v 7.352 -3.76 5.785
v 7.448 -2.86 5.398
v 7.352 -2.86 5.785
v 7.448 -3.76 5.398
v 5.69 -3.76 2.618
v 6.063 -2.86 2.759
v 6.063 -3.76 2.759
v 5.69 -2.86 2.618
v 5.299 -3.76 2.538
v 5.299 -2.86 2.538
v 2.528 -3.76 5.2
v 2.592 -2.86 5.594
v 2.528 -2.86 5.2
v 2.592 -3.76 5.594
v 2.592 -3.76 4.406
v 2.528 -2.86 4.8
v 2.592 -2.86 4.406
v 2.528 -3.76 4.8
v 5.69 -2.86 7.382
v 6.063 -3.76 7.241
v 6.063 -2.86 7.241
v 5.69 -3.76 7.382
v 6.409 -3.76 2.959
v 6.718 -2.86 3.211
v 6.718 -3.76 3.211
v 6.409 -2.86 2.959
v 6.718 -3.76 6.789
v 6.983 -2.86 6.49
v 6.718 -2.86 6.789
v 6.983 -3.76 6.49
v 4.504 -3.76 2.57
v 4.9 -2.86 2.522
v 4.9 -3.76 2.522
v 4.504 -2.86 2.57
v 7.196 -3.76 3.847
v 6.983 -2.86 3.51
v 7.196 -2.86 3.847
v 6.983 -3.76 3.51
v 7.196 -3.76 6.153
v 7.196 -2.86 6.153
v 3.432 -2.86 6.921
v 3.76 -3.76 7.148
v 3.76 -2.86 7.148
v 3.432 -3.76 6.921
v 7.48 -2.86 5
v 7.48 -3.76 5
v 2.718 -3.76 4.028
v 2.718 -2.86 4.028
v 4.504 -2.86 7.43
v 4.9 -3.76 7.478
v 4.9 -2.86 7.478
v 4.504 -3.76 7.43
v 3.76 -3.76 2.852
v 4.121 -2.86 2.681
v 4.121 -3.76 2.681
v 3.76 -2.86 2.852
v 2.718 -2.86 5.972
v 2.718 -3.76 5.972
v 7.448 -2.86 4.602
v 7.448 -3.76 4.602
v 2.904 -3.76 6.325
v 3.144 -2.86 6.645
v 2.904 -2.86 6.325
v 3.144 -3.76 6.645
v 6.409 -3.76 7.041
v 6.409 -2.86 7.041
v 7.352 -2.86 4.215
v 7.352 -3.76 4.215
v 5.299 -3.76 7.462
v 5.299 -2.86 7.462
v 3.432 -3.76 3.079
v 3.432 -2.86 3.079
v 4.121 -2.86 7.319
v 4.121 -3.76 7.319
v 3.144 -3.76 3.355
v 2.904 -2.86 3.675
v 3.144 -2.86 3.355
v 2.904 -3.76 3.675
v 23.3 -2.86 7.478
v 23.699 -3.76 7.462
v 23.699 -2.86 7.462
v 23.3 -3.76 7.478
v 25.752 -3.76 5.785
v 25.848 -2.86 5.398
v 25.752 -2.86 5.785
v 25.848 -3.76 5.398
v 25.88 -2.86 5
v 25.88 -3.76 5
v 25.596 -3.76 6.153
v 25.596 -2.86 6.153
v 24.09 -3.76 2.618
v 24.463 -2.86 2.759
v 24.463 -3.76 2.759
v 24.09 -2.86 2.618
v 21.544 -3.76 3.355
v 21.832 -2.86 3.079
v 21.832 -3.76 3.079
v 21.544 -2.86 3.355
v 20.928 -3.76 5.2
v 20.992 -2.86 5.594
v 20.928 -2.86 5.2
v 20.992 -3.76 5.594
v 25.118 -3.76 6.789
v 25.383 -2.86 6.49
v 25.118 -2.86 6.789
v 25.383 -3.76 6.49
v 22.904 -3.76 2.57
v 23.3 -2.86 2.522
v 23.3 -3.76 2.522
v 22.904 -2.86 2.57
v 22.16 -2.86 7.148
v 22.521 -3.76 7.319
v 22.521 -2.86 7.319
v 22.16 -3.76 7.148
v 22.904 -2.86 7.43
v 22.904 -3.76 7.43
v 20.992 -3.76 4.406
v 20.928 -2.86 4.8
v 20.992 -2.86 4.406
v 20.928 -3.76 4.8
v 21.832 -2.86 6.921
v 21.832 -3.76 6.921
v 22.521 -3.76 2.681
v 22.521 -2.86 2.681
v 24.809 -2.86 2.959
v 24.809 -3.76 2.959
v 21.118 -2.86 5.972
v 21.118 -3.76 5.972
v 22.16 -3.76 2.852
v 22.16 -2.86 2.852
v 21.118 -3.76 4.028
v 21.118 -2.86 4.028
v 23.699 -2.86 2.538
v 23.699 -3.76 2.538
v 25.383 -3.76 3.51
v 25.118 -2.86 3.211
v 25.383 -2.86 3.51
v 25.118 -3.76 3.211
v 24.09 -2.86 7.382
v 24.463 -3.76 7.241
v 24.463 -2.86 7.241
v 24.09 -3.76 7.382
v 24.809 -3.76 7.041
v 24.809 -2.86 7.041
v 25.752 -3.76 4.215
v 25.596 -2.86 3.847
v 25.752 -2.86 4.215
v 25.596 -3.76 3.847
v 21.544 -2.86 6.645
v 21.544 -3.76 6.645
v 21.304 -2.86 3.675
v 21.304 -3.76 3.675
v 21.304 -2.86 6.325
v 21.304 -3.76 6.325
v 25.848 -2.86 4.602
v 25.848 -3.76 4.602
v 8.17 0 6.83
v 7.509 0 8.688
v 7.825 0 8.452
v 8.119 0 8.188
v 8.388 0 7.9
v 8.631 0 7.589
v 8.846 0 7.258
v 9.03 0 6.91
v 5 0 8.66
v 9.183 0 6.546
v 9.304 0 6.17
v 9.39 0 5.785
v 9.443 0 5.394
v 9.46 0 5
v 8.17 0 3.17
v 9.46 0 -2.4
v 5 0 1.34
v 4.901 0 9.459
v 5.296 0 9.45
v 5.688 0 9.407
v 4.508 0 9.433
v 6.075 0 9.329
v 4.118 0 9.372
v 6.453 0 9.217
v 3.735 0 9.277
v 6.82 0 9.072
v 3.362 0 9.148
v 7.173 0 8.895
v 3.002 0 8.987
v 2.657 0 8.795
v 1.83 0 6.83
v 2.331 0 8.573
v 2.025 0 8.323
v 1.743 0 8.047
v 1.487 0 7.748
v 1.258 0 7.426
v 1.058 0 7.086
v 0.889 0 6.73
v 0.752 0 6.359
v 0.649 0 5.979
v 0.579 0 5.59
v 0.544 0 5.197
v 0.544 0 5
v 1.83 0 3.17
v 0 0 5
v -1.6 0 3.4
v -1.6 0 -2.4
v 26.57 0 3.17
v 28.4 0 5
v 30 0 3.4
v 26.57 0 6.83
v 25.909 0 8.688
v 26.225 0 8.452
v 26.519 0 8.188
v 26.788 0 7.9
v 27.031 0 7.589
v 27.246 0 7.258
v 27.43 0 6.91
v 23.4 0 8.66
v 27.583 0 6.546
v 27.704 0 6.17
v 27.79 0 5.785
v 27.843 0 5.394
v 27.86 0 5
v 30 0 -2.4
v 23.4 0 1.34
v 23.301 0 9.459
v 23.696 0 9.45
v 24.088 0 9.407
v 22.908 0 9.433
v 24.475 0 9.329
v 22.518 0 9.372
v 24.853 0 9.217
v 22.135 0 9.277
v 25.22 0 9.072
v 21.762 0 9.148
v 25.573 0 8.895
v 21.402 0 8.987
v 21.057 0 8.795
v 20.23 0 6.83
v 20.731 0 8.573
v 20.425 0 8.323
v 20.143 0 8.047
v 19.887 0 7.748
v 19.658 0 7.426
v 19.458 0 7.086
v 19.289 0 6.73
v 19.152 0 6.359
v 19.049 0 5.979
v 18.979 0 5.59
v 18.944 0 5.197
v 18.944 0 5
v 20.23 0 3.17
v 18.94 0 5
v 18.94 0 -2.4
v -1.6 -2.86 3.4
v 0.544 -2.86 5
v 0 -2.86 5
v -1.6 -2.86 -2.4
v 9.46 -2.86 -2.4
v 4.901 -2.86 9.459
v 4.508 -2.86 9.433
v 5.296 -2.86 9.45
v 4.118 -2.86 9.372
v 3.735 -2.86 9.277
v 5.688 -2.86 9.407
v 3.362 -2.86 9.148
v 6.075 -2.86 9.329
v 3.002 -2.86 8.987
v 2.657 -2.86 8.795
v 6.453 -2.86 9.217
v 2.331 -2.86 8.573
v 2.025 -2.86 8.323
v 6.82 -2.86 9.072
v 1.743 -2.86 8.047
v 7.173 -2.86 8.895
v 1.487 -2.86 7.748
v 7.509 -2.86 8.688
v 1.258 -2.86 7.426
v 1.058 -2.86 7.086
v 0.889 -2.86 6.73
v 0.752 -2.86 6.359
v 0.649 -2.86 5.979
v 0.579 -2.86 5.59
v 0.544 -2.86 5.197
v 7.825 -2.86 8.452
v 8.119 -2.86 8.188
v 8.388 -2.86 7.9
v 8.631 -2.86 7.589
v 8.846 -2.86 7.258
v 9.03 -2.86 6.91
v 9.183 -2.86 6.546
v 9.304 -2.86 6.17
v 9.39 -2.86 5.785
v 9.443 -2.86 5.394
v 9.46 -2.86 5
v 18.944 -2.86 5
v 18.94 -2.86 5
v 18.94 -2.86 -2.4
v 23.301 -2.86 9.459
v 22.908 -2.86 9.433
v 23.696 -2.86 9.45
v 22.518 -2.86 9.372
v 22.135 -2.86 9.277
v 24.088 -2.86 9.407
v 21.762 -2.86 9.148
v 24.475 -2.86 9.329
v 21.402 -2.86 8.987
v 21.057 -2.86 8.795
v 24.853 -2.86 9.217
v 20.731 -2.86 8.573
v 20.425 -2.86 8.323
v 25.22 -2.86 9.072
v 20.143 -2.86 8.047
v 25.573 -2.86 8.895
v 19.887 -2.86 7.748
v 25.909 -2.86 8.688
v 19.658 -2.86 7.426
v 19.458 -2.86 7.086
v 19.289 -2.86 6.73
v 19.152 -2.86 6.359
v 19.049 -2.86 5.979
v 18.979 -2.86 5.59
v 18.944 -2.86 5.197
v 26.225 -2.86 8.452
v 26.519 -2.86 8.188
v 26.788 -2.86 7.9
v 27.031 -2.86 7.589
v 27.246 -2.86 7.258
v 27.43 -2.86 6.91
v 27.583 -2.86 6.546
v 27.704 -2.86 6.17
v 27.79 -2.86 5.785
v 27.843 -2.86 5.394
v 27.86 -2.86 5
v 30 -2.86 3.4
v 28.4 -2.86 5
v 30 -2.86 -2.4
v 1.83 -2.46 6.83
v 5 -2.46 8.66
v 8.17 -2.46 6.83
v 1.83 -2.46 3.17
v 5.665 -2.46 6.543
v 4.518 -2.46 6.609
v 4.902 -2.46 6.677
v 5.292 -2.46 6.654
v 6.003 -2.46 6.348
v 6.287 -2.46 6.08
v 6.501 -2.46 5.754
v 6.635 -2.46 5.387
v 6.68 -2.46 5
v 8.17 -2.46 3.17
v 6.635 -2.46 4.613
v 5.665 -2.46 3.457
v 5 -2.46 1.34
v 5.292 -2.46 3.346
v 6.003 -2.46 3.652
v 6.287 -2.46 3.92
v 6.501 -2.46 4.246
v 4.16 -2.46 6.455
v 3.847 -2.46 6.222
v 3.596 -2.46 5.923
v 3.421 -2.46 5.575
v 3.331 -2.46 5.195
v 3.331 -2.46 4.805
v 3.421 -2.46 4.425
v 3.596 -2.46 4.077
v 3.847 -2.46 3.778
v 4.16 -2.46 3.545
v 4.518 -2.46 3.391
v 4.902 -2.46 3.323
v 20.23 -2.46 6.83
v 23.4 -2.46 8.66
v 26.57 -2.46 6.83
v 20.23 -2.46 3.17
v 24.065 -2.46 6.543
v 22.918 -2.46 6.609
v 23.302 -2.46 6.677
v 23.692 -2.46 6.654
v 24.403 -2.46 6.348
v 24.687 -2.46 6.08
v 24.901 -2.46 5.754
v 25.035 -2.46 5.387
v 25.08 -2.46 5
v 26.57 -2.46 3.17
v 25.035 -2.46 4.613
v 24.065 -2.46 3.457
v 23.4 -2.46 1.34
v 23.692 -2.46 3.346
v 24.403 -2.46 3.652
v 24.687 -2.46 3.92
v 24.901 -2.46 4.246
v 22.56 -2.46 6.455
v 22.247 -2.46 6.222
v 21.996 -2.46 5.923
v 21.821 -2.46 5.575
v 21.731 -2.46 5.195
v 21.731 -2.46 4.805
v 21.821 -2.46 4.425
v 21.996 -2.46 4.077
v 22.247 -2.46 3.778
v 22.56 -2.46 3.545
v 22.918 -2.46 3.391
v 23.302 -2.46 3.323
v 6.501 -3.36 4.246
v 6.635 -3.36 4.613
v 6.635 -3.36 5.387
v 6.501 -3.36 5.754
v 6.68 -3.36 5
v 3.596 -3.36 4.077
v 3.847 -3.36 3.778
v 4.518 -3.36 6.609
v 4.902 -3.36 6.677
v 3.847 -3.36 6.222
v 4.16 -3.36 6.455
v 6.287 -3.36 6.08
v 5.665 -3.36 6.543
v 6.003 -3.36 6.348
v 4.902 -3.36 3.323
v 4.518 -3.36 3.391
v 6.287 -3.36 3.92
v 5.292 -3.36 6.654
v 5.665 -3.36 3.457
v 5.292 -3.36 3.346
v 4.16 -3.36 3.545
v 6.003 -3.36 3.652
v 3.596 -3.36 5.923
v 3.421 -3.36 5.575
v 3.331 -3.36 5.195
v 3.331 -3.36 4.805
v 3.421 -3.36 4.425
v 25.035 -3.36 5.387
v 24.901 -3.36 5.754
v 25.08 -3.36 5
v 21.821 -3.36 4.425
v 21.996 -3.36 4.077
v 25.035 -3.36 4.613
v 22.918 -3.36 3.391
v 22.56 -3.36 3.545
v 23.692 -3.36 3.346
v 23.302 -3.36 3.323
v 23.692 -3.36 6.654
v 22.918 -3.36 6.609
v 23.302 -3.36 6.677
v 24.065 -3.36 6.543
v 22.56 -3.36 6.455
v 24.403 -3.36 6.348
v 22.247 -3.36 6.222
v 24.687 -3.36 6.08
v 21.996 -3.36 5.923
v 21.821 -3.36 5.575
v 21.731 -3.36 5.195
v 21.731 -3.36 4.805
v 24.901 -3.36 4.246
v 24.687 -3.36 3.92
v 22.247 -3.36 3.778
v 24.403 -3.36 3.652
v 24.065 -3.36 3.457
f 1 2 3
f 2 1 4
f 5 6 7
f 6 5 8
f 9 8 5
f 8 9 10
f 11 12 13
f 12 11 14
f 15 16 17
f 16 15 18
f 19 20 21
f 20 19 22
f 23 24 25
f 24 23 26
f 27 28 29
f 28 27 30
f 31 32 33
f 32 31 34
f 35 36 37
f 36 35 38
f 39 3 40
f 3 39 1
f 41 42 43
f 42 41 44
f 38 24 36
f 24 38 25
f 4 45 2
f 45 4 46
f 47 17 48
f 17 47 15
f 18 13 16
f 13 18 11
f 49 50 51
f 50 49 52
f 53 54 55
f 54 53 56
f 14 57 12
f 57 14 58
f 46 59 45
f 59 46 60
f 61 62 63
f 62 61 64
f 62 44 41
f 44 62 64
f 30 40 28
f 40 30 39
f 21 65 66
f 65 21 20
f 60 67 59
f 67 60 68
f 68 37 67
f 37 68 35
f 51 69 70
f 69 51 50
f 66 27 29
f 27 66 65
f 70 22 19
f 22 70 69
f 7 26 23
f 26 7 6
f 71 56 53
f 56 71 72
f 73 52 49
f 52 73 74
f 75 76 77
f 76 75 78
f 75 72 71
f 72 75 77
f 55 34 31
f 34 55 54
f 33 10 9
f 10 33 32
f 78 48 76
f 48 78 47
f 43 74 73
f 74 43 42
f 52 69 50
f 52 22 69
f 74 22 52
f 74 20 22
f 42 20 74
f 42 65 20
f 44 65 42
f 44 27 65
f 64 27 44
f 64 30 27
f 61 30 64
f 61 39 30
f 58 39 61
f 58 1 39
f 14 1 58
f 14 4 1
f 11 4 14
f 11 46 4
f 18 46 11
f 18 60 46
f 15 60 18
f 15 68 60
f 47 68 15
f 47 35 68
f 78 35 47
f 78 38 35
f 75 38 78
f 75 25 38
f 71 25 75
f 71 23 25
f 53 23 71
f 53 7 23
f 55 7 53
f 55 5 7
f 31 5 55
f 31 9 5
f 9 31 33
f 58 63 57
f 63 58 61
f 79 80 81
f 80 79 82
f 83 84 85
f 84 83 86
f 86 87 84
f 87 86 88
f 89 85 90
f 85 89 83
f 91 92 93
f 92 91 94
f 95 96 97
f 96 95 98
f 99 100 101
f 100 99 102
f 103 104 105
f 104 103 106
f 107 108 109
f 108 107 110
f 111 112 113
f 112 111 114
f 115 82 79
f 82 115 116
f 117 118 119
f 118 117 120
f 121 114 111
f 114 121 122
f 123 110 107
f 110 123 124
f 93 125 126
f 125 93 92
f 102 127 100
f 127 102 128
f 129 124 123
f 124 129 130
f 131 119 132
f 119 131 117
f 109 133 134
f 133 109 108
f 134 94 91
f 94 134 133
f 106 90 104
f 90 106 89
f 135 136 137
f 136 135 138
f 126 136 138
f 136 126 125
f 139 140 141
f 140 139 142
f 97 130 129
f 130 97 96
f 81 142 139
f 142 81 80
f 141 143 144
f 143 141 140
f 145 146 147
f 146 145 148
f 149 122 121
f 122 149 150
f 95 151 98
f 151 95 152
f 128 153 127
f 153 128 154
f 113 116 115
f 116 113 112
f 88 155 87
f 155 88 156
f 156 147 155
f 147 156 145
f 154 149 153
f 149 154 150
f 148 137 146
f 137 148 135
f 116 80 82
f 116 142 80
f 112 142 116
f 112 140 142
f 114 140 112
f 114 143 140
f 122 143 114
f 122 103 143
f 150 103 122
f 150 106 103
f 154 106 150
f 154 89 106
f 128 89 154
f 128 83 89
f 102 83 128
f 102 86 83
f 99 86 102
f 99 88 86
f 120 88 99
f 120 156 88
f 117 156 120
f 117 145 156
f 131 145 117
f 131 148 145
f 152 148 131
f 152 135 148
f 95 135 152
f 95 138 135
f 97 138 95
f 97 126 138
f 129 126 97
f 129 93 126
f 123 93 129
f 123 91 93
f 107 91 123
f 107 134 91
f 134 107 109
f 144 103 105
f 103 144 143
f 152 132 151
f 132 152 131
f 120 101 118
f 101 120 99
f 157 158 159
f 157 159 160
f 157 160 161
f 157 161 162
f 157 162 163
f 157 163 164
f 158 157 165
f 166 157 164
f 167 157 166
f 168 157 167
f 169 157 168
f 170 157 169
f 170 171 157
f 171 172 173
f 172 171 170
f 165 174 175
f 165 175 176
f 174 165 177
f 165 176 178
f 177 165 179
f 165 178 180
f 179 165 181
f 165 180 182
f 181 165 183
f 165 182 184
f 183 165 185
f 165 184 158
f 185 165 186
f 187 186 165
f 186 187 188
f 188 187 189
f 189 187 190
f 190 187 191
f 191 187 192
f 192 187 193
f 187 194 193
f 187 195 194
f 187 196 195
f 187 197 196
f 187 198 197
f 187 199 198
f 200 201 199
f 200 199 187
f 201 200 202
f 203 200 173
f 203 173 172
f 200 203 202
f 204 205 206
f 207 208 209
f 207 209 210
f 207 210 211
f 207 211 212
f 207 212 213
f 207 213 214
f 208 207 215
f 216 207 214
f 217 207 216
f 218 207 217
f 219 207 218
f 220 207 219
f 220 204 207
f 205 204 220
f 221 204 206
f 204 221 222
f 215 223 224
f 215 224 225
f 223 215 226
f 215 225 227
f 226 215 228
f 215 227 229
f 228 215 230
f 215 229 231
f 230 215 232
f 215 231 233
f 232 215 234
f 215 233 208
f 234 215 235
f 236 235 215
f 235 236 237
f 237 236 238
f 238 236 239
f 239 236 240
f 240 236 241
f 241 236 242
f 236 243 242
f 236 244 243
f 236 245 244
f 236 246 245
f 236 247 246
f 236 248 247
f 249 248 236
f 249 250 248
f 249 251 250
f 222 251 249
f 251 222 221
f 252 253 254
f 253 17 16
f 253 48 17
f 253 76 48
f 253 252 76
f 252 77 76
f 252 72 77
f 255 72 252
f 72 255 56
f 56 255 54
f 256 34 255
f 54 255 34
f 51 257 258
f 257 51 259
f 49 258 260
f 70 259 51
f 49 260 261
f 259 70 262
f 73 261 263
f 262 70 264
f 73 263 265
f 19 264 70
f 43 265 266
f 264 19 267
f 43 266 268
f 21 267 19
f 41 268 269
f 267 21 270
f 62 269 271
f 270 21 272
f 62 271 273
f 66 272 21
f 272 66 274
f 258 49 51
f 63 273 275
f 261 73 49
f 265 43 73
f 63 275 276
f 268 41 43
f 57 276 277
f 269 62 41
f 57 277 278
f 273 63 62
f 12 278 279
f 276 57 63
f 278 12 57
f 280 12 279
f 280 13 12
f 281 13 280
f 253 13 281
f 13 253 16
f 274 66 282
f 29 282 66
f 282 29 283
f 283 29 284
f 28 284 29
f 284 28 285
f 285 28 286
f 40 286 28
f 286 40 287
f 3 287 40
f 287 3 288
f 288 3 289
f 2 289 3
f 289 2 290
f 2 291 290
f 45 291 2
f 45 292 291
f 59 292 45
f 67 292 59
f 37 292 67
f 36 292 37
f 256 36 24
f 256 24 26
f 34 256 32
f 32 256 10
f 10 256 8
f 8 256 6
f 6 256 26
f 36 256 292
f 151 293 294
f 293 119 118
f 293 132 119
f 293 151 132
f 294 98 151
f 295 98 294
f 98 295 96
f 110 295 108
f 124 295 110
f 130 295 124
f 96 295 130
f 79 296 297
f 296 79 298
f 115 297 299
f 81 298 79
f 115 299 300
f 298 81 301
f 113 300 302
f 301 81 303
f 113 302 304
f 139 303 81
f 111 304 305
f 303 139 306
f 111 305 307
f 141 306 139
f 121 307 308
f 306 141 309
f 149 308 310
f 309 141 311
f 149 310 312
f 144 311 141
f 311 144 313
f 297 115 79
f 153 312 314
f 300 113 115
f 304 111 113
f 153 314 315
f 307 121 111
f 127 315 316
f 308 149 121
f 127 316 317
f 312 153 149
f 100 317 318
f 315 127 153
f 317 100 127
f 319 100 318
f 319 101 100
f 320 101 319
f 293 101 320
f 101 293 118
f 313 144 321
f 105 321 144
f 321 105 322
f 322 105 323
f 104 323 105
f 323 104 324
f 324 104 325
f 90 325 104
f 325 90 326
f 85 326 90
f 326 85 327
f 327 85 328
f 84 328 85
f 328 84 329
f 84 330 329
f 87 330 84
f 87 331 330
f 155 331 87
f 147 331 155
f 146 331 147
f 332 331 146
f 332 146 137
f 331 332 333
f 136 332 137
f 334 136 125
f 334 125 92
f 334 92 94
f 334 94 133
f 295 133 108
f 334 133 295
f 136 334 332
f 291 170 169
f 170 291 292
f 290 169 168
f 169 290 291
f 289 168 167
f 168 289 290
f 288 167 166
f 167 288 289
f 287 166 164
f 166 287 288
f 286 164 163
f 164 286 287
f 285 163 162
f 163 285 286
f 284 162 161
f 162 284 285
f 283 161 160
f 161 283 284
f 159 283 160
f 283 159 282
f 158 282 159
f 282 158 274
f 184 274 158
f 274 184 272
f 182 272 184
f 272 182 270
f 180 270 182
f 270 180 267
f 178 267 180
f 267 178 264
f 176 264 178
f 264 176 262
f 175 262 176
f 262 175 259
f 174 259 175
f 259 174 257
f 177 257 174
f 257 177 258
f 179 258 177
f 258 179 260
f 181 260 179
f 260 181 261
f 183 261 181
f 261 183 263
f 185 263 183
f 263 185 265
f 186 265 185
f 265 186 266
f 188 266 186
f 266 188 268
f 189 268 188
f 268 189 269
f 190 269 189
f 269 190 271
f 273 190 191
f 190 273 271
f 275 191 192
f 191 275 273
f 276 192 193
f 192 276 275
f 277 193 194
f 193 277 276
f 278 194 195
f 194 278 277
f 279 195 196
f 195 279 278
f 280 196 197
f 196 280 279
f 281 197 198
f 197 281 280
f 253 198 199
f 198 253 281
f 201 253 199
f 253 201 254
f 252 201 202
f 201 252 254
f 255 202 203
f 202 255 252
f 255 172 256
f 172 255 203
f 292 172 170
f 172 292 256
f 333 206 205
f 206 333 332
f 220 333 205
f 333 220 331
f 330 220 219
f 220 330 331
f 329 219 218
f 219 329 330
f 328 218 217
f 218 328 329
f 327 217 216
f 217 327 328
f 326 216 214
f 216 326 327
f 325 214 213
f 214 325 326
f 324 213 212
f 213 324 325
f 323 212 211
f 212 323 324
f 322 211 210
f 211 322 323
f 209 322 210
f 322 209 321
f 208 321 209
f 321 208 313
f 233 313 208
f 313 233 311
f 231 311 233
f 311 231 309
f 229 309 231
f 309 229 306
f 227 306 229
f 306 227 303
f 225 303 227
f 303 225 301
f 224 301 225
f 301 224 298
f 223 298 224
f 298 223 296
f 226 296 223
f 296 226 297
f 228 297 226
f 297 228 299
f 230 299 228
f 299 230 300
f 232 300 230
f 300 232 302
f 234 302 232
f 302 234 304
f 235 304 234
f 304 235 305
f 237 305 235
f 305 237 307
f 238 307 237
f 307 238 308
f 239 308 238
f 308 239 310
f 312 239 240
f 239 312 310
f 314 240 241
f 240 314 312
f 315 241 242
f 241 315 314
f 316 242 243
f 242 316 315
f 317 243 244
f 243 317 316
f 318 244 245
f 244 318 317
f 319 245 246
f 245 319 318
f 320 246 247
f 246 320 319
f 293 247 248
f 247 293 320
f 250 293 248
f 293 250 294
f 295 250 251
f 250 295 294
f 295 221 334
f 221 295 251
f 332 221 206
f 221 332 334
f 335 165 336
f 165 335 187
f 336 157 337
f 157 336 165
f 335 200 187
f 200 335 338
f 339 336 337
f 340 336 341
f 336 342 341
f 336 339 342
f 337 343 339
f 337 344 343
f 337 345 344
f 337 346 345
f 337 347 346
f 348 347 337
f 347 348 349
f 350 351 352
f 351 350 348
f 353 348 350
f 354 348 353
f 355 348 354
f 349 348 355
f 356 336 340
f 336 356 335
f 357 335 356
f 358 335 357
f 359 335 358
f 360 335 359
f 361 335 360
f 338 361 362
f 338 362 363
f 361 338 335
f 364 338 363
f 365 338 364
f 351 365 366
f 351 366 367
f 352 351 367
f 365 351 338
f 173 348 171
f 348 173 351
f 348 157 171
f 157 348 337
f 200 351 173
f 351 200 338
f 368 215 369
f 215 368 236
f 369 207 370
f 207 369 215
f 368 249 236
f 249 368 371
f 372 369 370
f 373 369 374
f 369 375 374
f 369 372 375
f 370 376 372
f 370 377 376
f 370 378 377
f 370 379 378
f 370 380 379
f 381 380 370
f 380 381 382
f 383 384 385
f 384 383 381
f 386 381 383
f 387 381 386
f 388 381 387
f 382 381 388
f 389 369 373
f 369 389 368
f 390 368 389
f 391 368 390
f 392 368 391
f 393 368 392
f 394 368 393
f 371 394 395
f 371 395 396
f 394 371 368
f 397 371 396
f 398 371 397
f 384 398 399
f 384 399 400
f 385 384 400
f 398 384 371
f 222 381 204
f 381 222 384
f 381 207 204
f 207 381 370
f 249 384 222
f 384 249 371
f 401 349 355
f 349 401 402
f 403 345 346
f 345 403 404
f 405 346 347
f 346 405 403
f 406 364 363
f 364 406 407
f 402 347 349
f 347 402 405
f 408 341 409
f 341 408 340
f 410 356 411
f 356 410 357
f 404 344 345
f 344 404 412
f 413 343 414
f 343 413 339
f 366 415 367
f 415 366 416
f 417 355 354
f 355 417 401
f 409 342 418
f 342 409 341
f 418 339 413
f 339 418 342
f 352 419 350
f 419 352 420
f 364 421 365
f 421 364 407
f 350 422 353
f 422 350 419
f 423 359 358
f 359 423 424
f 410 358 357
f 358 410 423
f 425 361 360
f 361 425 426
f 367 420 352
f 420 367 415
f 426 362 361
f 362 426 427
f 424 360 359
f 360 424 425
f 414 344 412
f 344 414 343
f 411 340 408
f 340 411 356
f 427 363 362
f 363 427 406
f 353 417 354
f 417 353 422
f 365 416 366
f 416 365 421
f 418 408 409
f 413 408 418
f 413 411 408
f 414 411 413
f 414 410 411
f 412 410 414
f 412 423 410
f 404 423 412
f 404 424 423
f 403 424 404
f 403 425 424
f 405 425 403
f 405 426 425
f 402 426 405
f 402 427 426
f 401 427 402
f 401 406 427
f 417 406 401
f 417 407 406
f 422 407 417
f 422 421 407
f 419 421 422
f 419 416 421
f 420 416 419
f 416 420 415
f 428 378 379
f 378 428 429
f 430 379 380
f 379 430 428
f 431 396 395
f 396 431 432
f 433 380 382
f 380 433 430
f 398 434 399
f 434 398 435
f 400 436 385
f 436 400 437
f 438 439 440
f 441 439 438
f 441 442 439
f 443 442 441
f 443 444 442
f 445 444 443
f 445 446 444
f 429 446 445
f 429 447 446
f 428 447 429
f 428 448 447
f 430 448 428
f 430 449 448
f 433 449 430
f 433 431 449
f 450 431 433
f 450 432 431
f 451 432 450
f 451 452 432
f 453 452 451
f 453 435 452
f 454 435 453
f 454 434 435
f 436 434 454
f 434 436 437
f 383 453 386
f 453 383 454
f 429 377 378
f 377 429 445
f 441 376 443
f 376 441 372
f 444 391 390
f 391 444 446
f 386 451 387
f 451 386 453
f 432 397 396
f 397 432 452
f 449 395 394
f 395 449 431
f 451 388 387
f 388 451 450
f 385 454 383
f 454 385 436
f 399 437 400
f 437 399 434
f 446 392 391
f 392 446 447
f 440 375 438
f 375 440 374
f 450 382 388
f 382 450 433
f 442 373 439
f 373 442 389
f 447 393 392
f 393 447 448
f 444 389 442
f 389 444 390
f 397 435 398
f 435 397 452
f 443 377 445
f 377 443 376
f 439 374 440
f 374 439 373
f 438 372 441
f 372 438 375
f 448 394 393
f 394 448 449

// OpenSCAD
// Copyright (C) 2025 Arif K. Rafiq
// This program is free software: you can redistribute it and/or modify
// it under the terms of the GNU General Public License as published by
// the Free Software Foundation, either version 3 of the License, or
// (at your option) any later version.

// This program is distributed in the hope that it will be useful,
// but WITHOUT ANY WARRANTY; without even the implied warranty of
// MERCHANTABILITY or FITNESS FOR A PARTICULAR PURPOSE.  See the
// GNU General Public License for more details.

// You should have received a copy of the GNU General Public License
// along with this file.  If not, see <https://www.gnu.org/licenses/>,
// or write to: license@temperedoptimism.com


/* 
(b)readth       :(w)est (X-)   (c)enter (X0) (e)east (X+)
(h)eight        :(d)own (Z-)   (g)round(Z0)  (u)p (Z+)

Vectors (v)     :(x), (y), (z)
Thicknesses (t) : Thicknesses to resolve 3D printer limits or rendering issues.
Proportion (p)  : container for grouping (r)adius and (i)ntensity into a singl 2d vector acccessed using .x and .y respectively
*/
/* 17:08 */
// Fixed in example3.scad       // Set limits in customizer
/* [Thicknesses (x),(y),(z)] */
tFitGap = [0.16, 0.16, 0.16];   //[0.00:0.01:0.64] 
tWallMin = [0.40, 0.40, 0.16];  //[0.16:0.08:1.60] 
/* [Proportional (x):(Radius, (y):(i)ntensity] */
pHexSink = [3.5, 2.3];          //[0.10:0.02:20.00] 
pFastShaft = [1.36, 5.80]; //0.10:0.02:20.00]
pWashSink = [4.00, 1.00]; //0.10:0.02:20.00]
/* [2D vectors (x), (y)] */
vTerminalW = [5.0, 5.0];        //[0.00:0.10:100] 
vTerminalE = [23.4, 5.0];       //[0.00:0.10:100] 
/* [Scalars] */
leadingEdge = 2.4; //[0.8:0.4:5.0]
flankEdge = 1.6; //[0.8:0.4:5.0]
bBoard = 28.4; //[20:0.1:100.0]
hBoard = 1.6; //0.8:04:3.2]
/* [Special ] */
fa0 = 4.0;     //[1:1:60]  
fs0 = 0.4;     //[0.1:0.1:4.0]  
fx0 = 3;       //[1,2,3,4,5,6,7,8,9,10]
rCorner = 1.6; //0.1
/* [Hidden] */ 
tEps=0.01; 

/* Calucualted at run time. */
pHexSurround = [pHexSink.x + (tWallMin.x * 2) + tFitGap.x, pHexSink.y + tWallMin.y + tFitGap.y];
pExtension = [pFastShaft.x + ((tWallMin.x + tFitGap.x)* 2), pFastShaft.y + tWallMin.y + tFitGap.y - pHexSurround.y -hBoard - pWashSink.y];

//30.00-35.00 Circles, Also look at the customizer!!
// Rotate
rotate([90,0,0]){
  difference(){
    union() {
      // hex pocket surround
      linear_extrude(pHexSurround.y, convexity=fx0){ 
        polygon([[vTerminalW.x + pHexSurround.x, vTerminalW.y],
              [ vTerminalW.x + pHexSurround.x, -leadingEdge],
              [-flankEdge, -leadingEdge],
              [-flankEdge, vTerminalW.y - rCorner],
              [-flankEdge + rCorner, vTerminalW.y]]);
        polygon([[vTerminalE.x - pHexSurround.x, vTerminalE.y],
              [ vTerminalE.x - pHexSurround.x, -leadingEdge],
              [bBoard + flankEdge, -leadingEdge],
              [bBoard + flankEdge, vTerminalE.y - rCorner],
              [bBoard + flankEdge - rCorner, vTerminalE.y]]);       
              
        for(v = [vTerminalW, vTerminalE]){
          translate(v)  circle(pHexSurround.x, $fa=fa0, $fs=fs0 );
        }
      }
      // shaft extension
      for(v= [vTerminalW, vTerminalE]){
          translate([v.x, v.y, pHexSurround.y - tEps]) cylinder(pExtension.y + tEps, r=pExtension.x, $fa=fa0, $fs=fs0);
      }
    }
    //hex pocket
    // Solve Conflicting bodies
    // This could be a loop see: 16:05 in the Video:
    //  https://www.youtube.com/watch?v=R-gRqGRss1k   
    for(v = [vTerminalW, vTerminalE]){
        #translate([v.x, v.y, -tEps]) rotate([0,0,30]) cylinder(pHexSurround.y - tWallMin.y + tEps, r=pHexSurround.x - (tWallMin.x * 2), $fn=6);
    }
    // fastner hole
    for(v = [vTerminalW, vTerminalE]){
        #translate([v.x, v.y, -hBoard -pWashSink.y]) cylinder(pFastShaft.y + tFitGap.y, r=pFastShaft.x + (tFitGap.x * 2), $fa=fa0, $fs=fs0);
    }
  }
}
